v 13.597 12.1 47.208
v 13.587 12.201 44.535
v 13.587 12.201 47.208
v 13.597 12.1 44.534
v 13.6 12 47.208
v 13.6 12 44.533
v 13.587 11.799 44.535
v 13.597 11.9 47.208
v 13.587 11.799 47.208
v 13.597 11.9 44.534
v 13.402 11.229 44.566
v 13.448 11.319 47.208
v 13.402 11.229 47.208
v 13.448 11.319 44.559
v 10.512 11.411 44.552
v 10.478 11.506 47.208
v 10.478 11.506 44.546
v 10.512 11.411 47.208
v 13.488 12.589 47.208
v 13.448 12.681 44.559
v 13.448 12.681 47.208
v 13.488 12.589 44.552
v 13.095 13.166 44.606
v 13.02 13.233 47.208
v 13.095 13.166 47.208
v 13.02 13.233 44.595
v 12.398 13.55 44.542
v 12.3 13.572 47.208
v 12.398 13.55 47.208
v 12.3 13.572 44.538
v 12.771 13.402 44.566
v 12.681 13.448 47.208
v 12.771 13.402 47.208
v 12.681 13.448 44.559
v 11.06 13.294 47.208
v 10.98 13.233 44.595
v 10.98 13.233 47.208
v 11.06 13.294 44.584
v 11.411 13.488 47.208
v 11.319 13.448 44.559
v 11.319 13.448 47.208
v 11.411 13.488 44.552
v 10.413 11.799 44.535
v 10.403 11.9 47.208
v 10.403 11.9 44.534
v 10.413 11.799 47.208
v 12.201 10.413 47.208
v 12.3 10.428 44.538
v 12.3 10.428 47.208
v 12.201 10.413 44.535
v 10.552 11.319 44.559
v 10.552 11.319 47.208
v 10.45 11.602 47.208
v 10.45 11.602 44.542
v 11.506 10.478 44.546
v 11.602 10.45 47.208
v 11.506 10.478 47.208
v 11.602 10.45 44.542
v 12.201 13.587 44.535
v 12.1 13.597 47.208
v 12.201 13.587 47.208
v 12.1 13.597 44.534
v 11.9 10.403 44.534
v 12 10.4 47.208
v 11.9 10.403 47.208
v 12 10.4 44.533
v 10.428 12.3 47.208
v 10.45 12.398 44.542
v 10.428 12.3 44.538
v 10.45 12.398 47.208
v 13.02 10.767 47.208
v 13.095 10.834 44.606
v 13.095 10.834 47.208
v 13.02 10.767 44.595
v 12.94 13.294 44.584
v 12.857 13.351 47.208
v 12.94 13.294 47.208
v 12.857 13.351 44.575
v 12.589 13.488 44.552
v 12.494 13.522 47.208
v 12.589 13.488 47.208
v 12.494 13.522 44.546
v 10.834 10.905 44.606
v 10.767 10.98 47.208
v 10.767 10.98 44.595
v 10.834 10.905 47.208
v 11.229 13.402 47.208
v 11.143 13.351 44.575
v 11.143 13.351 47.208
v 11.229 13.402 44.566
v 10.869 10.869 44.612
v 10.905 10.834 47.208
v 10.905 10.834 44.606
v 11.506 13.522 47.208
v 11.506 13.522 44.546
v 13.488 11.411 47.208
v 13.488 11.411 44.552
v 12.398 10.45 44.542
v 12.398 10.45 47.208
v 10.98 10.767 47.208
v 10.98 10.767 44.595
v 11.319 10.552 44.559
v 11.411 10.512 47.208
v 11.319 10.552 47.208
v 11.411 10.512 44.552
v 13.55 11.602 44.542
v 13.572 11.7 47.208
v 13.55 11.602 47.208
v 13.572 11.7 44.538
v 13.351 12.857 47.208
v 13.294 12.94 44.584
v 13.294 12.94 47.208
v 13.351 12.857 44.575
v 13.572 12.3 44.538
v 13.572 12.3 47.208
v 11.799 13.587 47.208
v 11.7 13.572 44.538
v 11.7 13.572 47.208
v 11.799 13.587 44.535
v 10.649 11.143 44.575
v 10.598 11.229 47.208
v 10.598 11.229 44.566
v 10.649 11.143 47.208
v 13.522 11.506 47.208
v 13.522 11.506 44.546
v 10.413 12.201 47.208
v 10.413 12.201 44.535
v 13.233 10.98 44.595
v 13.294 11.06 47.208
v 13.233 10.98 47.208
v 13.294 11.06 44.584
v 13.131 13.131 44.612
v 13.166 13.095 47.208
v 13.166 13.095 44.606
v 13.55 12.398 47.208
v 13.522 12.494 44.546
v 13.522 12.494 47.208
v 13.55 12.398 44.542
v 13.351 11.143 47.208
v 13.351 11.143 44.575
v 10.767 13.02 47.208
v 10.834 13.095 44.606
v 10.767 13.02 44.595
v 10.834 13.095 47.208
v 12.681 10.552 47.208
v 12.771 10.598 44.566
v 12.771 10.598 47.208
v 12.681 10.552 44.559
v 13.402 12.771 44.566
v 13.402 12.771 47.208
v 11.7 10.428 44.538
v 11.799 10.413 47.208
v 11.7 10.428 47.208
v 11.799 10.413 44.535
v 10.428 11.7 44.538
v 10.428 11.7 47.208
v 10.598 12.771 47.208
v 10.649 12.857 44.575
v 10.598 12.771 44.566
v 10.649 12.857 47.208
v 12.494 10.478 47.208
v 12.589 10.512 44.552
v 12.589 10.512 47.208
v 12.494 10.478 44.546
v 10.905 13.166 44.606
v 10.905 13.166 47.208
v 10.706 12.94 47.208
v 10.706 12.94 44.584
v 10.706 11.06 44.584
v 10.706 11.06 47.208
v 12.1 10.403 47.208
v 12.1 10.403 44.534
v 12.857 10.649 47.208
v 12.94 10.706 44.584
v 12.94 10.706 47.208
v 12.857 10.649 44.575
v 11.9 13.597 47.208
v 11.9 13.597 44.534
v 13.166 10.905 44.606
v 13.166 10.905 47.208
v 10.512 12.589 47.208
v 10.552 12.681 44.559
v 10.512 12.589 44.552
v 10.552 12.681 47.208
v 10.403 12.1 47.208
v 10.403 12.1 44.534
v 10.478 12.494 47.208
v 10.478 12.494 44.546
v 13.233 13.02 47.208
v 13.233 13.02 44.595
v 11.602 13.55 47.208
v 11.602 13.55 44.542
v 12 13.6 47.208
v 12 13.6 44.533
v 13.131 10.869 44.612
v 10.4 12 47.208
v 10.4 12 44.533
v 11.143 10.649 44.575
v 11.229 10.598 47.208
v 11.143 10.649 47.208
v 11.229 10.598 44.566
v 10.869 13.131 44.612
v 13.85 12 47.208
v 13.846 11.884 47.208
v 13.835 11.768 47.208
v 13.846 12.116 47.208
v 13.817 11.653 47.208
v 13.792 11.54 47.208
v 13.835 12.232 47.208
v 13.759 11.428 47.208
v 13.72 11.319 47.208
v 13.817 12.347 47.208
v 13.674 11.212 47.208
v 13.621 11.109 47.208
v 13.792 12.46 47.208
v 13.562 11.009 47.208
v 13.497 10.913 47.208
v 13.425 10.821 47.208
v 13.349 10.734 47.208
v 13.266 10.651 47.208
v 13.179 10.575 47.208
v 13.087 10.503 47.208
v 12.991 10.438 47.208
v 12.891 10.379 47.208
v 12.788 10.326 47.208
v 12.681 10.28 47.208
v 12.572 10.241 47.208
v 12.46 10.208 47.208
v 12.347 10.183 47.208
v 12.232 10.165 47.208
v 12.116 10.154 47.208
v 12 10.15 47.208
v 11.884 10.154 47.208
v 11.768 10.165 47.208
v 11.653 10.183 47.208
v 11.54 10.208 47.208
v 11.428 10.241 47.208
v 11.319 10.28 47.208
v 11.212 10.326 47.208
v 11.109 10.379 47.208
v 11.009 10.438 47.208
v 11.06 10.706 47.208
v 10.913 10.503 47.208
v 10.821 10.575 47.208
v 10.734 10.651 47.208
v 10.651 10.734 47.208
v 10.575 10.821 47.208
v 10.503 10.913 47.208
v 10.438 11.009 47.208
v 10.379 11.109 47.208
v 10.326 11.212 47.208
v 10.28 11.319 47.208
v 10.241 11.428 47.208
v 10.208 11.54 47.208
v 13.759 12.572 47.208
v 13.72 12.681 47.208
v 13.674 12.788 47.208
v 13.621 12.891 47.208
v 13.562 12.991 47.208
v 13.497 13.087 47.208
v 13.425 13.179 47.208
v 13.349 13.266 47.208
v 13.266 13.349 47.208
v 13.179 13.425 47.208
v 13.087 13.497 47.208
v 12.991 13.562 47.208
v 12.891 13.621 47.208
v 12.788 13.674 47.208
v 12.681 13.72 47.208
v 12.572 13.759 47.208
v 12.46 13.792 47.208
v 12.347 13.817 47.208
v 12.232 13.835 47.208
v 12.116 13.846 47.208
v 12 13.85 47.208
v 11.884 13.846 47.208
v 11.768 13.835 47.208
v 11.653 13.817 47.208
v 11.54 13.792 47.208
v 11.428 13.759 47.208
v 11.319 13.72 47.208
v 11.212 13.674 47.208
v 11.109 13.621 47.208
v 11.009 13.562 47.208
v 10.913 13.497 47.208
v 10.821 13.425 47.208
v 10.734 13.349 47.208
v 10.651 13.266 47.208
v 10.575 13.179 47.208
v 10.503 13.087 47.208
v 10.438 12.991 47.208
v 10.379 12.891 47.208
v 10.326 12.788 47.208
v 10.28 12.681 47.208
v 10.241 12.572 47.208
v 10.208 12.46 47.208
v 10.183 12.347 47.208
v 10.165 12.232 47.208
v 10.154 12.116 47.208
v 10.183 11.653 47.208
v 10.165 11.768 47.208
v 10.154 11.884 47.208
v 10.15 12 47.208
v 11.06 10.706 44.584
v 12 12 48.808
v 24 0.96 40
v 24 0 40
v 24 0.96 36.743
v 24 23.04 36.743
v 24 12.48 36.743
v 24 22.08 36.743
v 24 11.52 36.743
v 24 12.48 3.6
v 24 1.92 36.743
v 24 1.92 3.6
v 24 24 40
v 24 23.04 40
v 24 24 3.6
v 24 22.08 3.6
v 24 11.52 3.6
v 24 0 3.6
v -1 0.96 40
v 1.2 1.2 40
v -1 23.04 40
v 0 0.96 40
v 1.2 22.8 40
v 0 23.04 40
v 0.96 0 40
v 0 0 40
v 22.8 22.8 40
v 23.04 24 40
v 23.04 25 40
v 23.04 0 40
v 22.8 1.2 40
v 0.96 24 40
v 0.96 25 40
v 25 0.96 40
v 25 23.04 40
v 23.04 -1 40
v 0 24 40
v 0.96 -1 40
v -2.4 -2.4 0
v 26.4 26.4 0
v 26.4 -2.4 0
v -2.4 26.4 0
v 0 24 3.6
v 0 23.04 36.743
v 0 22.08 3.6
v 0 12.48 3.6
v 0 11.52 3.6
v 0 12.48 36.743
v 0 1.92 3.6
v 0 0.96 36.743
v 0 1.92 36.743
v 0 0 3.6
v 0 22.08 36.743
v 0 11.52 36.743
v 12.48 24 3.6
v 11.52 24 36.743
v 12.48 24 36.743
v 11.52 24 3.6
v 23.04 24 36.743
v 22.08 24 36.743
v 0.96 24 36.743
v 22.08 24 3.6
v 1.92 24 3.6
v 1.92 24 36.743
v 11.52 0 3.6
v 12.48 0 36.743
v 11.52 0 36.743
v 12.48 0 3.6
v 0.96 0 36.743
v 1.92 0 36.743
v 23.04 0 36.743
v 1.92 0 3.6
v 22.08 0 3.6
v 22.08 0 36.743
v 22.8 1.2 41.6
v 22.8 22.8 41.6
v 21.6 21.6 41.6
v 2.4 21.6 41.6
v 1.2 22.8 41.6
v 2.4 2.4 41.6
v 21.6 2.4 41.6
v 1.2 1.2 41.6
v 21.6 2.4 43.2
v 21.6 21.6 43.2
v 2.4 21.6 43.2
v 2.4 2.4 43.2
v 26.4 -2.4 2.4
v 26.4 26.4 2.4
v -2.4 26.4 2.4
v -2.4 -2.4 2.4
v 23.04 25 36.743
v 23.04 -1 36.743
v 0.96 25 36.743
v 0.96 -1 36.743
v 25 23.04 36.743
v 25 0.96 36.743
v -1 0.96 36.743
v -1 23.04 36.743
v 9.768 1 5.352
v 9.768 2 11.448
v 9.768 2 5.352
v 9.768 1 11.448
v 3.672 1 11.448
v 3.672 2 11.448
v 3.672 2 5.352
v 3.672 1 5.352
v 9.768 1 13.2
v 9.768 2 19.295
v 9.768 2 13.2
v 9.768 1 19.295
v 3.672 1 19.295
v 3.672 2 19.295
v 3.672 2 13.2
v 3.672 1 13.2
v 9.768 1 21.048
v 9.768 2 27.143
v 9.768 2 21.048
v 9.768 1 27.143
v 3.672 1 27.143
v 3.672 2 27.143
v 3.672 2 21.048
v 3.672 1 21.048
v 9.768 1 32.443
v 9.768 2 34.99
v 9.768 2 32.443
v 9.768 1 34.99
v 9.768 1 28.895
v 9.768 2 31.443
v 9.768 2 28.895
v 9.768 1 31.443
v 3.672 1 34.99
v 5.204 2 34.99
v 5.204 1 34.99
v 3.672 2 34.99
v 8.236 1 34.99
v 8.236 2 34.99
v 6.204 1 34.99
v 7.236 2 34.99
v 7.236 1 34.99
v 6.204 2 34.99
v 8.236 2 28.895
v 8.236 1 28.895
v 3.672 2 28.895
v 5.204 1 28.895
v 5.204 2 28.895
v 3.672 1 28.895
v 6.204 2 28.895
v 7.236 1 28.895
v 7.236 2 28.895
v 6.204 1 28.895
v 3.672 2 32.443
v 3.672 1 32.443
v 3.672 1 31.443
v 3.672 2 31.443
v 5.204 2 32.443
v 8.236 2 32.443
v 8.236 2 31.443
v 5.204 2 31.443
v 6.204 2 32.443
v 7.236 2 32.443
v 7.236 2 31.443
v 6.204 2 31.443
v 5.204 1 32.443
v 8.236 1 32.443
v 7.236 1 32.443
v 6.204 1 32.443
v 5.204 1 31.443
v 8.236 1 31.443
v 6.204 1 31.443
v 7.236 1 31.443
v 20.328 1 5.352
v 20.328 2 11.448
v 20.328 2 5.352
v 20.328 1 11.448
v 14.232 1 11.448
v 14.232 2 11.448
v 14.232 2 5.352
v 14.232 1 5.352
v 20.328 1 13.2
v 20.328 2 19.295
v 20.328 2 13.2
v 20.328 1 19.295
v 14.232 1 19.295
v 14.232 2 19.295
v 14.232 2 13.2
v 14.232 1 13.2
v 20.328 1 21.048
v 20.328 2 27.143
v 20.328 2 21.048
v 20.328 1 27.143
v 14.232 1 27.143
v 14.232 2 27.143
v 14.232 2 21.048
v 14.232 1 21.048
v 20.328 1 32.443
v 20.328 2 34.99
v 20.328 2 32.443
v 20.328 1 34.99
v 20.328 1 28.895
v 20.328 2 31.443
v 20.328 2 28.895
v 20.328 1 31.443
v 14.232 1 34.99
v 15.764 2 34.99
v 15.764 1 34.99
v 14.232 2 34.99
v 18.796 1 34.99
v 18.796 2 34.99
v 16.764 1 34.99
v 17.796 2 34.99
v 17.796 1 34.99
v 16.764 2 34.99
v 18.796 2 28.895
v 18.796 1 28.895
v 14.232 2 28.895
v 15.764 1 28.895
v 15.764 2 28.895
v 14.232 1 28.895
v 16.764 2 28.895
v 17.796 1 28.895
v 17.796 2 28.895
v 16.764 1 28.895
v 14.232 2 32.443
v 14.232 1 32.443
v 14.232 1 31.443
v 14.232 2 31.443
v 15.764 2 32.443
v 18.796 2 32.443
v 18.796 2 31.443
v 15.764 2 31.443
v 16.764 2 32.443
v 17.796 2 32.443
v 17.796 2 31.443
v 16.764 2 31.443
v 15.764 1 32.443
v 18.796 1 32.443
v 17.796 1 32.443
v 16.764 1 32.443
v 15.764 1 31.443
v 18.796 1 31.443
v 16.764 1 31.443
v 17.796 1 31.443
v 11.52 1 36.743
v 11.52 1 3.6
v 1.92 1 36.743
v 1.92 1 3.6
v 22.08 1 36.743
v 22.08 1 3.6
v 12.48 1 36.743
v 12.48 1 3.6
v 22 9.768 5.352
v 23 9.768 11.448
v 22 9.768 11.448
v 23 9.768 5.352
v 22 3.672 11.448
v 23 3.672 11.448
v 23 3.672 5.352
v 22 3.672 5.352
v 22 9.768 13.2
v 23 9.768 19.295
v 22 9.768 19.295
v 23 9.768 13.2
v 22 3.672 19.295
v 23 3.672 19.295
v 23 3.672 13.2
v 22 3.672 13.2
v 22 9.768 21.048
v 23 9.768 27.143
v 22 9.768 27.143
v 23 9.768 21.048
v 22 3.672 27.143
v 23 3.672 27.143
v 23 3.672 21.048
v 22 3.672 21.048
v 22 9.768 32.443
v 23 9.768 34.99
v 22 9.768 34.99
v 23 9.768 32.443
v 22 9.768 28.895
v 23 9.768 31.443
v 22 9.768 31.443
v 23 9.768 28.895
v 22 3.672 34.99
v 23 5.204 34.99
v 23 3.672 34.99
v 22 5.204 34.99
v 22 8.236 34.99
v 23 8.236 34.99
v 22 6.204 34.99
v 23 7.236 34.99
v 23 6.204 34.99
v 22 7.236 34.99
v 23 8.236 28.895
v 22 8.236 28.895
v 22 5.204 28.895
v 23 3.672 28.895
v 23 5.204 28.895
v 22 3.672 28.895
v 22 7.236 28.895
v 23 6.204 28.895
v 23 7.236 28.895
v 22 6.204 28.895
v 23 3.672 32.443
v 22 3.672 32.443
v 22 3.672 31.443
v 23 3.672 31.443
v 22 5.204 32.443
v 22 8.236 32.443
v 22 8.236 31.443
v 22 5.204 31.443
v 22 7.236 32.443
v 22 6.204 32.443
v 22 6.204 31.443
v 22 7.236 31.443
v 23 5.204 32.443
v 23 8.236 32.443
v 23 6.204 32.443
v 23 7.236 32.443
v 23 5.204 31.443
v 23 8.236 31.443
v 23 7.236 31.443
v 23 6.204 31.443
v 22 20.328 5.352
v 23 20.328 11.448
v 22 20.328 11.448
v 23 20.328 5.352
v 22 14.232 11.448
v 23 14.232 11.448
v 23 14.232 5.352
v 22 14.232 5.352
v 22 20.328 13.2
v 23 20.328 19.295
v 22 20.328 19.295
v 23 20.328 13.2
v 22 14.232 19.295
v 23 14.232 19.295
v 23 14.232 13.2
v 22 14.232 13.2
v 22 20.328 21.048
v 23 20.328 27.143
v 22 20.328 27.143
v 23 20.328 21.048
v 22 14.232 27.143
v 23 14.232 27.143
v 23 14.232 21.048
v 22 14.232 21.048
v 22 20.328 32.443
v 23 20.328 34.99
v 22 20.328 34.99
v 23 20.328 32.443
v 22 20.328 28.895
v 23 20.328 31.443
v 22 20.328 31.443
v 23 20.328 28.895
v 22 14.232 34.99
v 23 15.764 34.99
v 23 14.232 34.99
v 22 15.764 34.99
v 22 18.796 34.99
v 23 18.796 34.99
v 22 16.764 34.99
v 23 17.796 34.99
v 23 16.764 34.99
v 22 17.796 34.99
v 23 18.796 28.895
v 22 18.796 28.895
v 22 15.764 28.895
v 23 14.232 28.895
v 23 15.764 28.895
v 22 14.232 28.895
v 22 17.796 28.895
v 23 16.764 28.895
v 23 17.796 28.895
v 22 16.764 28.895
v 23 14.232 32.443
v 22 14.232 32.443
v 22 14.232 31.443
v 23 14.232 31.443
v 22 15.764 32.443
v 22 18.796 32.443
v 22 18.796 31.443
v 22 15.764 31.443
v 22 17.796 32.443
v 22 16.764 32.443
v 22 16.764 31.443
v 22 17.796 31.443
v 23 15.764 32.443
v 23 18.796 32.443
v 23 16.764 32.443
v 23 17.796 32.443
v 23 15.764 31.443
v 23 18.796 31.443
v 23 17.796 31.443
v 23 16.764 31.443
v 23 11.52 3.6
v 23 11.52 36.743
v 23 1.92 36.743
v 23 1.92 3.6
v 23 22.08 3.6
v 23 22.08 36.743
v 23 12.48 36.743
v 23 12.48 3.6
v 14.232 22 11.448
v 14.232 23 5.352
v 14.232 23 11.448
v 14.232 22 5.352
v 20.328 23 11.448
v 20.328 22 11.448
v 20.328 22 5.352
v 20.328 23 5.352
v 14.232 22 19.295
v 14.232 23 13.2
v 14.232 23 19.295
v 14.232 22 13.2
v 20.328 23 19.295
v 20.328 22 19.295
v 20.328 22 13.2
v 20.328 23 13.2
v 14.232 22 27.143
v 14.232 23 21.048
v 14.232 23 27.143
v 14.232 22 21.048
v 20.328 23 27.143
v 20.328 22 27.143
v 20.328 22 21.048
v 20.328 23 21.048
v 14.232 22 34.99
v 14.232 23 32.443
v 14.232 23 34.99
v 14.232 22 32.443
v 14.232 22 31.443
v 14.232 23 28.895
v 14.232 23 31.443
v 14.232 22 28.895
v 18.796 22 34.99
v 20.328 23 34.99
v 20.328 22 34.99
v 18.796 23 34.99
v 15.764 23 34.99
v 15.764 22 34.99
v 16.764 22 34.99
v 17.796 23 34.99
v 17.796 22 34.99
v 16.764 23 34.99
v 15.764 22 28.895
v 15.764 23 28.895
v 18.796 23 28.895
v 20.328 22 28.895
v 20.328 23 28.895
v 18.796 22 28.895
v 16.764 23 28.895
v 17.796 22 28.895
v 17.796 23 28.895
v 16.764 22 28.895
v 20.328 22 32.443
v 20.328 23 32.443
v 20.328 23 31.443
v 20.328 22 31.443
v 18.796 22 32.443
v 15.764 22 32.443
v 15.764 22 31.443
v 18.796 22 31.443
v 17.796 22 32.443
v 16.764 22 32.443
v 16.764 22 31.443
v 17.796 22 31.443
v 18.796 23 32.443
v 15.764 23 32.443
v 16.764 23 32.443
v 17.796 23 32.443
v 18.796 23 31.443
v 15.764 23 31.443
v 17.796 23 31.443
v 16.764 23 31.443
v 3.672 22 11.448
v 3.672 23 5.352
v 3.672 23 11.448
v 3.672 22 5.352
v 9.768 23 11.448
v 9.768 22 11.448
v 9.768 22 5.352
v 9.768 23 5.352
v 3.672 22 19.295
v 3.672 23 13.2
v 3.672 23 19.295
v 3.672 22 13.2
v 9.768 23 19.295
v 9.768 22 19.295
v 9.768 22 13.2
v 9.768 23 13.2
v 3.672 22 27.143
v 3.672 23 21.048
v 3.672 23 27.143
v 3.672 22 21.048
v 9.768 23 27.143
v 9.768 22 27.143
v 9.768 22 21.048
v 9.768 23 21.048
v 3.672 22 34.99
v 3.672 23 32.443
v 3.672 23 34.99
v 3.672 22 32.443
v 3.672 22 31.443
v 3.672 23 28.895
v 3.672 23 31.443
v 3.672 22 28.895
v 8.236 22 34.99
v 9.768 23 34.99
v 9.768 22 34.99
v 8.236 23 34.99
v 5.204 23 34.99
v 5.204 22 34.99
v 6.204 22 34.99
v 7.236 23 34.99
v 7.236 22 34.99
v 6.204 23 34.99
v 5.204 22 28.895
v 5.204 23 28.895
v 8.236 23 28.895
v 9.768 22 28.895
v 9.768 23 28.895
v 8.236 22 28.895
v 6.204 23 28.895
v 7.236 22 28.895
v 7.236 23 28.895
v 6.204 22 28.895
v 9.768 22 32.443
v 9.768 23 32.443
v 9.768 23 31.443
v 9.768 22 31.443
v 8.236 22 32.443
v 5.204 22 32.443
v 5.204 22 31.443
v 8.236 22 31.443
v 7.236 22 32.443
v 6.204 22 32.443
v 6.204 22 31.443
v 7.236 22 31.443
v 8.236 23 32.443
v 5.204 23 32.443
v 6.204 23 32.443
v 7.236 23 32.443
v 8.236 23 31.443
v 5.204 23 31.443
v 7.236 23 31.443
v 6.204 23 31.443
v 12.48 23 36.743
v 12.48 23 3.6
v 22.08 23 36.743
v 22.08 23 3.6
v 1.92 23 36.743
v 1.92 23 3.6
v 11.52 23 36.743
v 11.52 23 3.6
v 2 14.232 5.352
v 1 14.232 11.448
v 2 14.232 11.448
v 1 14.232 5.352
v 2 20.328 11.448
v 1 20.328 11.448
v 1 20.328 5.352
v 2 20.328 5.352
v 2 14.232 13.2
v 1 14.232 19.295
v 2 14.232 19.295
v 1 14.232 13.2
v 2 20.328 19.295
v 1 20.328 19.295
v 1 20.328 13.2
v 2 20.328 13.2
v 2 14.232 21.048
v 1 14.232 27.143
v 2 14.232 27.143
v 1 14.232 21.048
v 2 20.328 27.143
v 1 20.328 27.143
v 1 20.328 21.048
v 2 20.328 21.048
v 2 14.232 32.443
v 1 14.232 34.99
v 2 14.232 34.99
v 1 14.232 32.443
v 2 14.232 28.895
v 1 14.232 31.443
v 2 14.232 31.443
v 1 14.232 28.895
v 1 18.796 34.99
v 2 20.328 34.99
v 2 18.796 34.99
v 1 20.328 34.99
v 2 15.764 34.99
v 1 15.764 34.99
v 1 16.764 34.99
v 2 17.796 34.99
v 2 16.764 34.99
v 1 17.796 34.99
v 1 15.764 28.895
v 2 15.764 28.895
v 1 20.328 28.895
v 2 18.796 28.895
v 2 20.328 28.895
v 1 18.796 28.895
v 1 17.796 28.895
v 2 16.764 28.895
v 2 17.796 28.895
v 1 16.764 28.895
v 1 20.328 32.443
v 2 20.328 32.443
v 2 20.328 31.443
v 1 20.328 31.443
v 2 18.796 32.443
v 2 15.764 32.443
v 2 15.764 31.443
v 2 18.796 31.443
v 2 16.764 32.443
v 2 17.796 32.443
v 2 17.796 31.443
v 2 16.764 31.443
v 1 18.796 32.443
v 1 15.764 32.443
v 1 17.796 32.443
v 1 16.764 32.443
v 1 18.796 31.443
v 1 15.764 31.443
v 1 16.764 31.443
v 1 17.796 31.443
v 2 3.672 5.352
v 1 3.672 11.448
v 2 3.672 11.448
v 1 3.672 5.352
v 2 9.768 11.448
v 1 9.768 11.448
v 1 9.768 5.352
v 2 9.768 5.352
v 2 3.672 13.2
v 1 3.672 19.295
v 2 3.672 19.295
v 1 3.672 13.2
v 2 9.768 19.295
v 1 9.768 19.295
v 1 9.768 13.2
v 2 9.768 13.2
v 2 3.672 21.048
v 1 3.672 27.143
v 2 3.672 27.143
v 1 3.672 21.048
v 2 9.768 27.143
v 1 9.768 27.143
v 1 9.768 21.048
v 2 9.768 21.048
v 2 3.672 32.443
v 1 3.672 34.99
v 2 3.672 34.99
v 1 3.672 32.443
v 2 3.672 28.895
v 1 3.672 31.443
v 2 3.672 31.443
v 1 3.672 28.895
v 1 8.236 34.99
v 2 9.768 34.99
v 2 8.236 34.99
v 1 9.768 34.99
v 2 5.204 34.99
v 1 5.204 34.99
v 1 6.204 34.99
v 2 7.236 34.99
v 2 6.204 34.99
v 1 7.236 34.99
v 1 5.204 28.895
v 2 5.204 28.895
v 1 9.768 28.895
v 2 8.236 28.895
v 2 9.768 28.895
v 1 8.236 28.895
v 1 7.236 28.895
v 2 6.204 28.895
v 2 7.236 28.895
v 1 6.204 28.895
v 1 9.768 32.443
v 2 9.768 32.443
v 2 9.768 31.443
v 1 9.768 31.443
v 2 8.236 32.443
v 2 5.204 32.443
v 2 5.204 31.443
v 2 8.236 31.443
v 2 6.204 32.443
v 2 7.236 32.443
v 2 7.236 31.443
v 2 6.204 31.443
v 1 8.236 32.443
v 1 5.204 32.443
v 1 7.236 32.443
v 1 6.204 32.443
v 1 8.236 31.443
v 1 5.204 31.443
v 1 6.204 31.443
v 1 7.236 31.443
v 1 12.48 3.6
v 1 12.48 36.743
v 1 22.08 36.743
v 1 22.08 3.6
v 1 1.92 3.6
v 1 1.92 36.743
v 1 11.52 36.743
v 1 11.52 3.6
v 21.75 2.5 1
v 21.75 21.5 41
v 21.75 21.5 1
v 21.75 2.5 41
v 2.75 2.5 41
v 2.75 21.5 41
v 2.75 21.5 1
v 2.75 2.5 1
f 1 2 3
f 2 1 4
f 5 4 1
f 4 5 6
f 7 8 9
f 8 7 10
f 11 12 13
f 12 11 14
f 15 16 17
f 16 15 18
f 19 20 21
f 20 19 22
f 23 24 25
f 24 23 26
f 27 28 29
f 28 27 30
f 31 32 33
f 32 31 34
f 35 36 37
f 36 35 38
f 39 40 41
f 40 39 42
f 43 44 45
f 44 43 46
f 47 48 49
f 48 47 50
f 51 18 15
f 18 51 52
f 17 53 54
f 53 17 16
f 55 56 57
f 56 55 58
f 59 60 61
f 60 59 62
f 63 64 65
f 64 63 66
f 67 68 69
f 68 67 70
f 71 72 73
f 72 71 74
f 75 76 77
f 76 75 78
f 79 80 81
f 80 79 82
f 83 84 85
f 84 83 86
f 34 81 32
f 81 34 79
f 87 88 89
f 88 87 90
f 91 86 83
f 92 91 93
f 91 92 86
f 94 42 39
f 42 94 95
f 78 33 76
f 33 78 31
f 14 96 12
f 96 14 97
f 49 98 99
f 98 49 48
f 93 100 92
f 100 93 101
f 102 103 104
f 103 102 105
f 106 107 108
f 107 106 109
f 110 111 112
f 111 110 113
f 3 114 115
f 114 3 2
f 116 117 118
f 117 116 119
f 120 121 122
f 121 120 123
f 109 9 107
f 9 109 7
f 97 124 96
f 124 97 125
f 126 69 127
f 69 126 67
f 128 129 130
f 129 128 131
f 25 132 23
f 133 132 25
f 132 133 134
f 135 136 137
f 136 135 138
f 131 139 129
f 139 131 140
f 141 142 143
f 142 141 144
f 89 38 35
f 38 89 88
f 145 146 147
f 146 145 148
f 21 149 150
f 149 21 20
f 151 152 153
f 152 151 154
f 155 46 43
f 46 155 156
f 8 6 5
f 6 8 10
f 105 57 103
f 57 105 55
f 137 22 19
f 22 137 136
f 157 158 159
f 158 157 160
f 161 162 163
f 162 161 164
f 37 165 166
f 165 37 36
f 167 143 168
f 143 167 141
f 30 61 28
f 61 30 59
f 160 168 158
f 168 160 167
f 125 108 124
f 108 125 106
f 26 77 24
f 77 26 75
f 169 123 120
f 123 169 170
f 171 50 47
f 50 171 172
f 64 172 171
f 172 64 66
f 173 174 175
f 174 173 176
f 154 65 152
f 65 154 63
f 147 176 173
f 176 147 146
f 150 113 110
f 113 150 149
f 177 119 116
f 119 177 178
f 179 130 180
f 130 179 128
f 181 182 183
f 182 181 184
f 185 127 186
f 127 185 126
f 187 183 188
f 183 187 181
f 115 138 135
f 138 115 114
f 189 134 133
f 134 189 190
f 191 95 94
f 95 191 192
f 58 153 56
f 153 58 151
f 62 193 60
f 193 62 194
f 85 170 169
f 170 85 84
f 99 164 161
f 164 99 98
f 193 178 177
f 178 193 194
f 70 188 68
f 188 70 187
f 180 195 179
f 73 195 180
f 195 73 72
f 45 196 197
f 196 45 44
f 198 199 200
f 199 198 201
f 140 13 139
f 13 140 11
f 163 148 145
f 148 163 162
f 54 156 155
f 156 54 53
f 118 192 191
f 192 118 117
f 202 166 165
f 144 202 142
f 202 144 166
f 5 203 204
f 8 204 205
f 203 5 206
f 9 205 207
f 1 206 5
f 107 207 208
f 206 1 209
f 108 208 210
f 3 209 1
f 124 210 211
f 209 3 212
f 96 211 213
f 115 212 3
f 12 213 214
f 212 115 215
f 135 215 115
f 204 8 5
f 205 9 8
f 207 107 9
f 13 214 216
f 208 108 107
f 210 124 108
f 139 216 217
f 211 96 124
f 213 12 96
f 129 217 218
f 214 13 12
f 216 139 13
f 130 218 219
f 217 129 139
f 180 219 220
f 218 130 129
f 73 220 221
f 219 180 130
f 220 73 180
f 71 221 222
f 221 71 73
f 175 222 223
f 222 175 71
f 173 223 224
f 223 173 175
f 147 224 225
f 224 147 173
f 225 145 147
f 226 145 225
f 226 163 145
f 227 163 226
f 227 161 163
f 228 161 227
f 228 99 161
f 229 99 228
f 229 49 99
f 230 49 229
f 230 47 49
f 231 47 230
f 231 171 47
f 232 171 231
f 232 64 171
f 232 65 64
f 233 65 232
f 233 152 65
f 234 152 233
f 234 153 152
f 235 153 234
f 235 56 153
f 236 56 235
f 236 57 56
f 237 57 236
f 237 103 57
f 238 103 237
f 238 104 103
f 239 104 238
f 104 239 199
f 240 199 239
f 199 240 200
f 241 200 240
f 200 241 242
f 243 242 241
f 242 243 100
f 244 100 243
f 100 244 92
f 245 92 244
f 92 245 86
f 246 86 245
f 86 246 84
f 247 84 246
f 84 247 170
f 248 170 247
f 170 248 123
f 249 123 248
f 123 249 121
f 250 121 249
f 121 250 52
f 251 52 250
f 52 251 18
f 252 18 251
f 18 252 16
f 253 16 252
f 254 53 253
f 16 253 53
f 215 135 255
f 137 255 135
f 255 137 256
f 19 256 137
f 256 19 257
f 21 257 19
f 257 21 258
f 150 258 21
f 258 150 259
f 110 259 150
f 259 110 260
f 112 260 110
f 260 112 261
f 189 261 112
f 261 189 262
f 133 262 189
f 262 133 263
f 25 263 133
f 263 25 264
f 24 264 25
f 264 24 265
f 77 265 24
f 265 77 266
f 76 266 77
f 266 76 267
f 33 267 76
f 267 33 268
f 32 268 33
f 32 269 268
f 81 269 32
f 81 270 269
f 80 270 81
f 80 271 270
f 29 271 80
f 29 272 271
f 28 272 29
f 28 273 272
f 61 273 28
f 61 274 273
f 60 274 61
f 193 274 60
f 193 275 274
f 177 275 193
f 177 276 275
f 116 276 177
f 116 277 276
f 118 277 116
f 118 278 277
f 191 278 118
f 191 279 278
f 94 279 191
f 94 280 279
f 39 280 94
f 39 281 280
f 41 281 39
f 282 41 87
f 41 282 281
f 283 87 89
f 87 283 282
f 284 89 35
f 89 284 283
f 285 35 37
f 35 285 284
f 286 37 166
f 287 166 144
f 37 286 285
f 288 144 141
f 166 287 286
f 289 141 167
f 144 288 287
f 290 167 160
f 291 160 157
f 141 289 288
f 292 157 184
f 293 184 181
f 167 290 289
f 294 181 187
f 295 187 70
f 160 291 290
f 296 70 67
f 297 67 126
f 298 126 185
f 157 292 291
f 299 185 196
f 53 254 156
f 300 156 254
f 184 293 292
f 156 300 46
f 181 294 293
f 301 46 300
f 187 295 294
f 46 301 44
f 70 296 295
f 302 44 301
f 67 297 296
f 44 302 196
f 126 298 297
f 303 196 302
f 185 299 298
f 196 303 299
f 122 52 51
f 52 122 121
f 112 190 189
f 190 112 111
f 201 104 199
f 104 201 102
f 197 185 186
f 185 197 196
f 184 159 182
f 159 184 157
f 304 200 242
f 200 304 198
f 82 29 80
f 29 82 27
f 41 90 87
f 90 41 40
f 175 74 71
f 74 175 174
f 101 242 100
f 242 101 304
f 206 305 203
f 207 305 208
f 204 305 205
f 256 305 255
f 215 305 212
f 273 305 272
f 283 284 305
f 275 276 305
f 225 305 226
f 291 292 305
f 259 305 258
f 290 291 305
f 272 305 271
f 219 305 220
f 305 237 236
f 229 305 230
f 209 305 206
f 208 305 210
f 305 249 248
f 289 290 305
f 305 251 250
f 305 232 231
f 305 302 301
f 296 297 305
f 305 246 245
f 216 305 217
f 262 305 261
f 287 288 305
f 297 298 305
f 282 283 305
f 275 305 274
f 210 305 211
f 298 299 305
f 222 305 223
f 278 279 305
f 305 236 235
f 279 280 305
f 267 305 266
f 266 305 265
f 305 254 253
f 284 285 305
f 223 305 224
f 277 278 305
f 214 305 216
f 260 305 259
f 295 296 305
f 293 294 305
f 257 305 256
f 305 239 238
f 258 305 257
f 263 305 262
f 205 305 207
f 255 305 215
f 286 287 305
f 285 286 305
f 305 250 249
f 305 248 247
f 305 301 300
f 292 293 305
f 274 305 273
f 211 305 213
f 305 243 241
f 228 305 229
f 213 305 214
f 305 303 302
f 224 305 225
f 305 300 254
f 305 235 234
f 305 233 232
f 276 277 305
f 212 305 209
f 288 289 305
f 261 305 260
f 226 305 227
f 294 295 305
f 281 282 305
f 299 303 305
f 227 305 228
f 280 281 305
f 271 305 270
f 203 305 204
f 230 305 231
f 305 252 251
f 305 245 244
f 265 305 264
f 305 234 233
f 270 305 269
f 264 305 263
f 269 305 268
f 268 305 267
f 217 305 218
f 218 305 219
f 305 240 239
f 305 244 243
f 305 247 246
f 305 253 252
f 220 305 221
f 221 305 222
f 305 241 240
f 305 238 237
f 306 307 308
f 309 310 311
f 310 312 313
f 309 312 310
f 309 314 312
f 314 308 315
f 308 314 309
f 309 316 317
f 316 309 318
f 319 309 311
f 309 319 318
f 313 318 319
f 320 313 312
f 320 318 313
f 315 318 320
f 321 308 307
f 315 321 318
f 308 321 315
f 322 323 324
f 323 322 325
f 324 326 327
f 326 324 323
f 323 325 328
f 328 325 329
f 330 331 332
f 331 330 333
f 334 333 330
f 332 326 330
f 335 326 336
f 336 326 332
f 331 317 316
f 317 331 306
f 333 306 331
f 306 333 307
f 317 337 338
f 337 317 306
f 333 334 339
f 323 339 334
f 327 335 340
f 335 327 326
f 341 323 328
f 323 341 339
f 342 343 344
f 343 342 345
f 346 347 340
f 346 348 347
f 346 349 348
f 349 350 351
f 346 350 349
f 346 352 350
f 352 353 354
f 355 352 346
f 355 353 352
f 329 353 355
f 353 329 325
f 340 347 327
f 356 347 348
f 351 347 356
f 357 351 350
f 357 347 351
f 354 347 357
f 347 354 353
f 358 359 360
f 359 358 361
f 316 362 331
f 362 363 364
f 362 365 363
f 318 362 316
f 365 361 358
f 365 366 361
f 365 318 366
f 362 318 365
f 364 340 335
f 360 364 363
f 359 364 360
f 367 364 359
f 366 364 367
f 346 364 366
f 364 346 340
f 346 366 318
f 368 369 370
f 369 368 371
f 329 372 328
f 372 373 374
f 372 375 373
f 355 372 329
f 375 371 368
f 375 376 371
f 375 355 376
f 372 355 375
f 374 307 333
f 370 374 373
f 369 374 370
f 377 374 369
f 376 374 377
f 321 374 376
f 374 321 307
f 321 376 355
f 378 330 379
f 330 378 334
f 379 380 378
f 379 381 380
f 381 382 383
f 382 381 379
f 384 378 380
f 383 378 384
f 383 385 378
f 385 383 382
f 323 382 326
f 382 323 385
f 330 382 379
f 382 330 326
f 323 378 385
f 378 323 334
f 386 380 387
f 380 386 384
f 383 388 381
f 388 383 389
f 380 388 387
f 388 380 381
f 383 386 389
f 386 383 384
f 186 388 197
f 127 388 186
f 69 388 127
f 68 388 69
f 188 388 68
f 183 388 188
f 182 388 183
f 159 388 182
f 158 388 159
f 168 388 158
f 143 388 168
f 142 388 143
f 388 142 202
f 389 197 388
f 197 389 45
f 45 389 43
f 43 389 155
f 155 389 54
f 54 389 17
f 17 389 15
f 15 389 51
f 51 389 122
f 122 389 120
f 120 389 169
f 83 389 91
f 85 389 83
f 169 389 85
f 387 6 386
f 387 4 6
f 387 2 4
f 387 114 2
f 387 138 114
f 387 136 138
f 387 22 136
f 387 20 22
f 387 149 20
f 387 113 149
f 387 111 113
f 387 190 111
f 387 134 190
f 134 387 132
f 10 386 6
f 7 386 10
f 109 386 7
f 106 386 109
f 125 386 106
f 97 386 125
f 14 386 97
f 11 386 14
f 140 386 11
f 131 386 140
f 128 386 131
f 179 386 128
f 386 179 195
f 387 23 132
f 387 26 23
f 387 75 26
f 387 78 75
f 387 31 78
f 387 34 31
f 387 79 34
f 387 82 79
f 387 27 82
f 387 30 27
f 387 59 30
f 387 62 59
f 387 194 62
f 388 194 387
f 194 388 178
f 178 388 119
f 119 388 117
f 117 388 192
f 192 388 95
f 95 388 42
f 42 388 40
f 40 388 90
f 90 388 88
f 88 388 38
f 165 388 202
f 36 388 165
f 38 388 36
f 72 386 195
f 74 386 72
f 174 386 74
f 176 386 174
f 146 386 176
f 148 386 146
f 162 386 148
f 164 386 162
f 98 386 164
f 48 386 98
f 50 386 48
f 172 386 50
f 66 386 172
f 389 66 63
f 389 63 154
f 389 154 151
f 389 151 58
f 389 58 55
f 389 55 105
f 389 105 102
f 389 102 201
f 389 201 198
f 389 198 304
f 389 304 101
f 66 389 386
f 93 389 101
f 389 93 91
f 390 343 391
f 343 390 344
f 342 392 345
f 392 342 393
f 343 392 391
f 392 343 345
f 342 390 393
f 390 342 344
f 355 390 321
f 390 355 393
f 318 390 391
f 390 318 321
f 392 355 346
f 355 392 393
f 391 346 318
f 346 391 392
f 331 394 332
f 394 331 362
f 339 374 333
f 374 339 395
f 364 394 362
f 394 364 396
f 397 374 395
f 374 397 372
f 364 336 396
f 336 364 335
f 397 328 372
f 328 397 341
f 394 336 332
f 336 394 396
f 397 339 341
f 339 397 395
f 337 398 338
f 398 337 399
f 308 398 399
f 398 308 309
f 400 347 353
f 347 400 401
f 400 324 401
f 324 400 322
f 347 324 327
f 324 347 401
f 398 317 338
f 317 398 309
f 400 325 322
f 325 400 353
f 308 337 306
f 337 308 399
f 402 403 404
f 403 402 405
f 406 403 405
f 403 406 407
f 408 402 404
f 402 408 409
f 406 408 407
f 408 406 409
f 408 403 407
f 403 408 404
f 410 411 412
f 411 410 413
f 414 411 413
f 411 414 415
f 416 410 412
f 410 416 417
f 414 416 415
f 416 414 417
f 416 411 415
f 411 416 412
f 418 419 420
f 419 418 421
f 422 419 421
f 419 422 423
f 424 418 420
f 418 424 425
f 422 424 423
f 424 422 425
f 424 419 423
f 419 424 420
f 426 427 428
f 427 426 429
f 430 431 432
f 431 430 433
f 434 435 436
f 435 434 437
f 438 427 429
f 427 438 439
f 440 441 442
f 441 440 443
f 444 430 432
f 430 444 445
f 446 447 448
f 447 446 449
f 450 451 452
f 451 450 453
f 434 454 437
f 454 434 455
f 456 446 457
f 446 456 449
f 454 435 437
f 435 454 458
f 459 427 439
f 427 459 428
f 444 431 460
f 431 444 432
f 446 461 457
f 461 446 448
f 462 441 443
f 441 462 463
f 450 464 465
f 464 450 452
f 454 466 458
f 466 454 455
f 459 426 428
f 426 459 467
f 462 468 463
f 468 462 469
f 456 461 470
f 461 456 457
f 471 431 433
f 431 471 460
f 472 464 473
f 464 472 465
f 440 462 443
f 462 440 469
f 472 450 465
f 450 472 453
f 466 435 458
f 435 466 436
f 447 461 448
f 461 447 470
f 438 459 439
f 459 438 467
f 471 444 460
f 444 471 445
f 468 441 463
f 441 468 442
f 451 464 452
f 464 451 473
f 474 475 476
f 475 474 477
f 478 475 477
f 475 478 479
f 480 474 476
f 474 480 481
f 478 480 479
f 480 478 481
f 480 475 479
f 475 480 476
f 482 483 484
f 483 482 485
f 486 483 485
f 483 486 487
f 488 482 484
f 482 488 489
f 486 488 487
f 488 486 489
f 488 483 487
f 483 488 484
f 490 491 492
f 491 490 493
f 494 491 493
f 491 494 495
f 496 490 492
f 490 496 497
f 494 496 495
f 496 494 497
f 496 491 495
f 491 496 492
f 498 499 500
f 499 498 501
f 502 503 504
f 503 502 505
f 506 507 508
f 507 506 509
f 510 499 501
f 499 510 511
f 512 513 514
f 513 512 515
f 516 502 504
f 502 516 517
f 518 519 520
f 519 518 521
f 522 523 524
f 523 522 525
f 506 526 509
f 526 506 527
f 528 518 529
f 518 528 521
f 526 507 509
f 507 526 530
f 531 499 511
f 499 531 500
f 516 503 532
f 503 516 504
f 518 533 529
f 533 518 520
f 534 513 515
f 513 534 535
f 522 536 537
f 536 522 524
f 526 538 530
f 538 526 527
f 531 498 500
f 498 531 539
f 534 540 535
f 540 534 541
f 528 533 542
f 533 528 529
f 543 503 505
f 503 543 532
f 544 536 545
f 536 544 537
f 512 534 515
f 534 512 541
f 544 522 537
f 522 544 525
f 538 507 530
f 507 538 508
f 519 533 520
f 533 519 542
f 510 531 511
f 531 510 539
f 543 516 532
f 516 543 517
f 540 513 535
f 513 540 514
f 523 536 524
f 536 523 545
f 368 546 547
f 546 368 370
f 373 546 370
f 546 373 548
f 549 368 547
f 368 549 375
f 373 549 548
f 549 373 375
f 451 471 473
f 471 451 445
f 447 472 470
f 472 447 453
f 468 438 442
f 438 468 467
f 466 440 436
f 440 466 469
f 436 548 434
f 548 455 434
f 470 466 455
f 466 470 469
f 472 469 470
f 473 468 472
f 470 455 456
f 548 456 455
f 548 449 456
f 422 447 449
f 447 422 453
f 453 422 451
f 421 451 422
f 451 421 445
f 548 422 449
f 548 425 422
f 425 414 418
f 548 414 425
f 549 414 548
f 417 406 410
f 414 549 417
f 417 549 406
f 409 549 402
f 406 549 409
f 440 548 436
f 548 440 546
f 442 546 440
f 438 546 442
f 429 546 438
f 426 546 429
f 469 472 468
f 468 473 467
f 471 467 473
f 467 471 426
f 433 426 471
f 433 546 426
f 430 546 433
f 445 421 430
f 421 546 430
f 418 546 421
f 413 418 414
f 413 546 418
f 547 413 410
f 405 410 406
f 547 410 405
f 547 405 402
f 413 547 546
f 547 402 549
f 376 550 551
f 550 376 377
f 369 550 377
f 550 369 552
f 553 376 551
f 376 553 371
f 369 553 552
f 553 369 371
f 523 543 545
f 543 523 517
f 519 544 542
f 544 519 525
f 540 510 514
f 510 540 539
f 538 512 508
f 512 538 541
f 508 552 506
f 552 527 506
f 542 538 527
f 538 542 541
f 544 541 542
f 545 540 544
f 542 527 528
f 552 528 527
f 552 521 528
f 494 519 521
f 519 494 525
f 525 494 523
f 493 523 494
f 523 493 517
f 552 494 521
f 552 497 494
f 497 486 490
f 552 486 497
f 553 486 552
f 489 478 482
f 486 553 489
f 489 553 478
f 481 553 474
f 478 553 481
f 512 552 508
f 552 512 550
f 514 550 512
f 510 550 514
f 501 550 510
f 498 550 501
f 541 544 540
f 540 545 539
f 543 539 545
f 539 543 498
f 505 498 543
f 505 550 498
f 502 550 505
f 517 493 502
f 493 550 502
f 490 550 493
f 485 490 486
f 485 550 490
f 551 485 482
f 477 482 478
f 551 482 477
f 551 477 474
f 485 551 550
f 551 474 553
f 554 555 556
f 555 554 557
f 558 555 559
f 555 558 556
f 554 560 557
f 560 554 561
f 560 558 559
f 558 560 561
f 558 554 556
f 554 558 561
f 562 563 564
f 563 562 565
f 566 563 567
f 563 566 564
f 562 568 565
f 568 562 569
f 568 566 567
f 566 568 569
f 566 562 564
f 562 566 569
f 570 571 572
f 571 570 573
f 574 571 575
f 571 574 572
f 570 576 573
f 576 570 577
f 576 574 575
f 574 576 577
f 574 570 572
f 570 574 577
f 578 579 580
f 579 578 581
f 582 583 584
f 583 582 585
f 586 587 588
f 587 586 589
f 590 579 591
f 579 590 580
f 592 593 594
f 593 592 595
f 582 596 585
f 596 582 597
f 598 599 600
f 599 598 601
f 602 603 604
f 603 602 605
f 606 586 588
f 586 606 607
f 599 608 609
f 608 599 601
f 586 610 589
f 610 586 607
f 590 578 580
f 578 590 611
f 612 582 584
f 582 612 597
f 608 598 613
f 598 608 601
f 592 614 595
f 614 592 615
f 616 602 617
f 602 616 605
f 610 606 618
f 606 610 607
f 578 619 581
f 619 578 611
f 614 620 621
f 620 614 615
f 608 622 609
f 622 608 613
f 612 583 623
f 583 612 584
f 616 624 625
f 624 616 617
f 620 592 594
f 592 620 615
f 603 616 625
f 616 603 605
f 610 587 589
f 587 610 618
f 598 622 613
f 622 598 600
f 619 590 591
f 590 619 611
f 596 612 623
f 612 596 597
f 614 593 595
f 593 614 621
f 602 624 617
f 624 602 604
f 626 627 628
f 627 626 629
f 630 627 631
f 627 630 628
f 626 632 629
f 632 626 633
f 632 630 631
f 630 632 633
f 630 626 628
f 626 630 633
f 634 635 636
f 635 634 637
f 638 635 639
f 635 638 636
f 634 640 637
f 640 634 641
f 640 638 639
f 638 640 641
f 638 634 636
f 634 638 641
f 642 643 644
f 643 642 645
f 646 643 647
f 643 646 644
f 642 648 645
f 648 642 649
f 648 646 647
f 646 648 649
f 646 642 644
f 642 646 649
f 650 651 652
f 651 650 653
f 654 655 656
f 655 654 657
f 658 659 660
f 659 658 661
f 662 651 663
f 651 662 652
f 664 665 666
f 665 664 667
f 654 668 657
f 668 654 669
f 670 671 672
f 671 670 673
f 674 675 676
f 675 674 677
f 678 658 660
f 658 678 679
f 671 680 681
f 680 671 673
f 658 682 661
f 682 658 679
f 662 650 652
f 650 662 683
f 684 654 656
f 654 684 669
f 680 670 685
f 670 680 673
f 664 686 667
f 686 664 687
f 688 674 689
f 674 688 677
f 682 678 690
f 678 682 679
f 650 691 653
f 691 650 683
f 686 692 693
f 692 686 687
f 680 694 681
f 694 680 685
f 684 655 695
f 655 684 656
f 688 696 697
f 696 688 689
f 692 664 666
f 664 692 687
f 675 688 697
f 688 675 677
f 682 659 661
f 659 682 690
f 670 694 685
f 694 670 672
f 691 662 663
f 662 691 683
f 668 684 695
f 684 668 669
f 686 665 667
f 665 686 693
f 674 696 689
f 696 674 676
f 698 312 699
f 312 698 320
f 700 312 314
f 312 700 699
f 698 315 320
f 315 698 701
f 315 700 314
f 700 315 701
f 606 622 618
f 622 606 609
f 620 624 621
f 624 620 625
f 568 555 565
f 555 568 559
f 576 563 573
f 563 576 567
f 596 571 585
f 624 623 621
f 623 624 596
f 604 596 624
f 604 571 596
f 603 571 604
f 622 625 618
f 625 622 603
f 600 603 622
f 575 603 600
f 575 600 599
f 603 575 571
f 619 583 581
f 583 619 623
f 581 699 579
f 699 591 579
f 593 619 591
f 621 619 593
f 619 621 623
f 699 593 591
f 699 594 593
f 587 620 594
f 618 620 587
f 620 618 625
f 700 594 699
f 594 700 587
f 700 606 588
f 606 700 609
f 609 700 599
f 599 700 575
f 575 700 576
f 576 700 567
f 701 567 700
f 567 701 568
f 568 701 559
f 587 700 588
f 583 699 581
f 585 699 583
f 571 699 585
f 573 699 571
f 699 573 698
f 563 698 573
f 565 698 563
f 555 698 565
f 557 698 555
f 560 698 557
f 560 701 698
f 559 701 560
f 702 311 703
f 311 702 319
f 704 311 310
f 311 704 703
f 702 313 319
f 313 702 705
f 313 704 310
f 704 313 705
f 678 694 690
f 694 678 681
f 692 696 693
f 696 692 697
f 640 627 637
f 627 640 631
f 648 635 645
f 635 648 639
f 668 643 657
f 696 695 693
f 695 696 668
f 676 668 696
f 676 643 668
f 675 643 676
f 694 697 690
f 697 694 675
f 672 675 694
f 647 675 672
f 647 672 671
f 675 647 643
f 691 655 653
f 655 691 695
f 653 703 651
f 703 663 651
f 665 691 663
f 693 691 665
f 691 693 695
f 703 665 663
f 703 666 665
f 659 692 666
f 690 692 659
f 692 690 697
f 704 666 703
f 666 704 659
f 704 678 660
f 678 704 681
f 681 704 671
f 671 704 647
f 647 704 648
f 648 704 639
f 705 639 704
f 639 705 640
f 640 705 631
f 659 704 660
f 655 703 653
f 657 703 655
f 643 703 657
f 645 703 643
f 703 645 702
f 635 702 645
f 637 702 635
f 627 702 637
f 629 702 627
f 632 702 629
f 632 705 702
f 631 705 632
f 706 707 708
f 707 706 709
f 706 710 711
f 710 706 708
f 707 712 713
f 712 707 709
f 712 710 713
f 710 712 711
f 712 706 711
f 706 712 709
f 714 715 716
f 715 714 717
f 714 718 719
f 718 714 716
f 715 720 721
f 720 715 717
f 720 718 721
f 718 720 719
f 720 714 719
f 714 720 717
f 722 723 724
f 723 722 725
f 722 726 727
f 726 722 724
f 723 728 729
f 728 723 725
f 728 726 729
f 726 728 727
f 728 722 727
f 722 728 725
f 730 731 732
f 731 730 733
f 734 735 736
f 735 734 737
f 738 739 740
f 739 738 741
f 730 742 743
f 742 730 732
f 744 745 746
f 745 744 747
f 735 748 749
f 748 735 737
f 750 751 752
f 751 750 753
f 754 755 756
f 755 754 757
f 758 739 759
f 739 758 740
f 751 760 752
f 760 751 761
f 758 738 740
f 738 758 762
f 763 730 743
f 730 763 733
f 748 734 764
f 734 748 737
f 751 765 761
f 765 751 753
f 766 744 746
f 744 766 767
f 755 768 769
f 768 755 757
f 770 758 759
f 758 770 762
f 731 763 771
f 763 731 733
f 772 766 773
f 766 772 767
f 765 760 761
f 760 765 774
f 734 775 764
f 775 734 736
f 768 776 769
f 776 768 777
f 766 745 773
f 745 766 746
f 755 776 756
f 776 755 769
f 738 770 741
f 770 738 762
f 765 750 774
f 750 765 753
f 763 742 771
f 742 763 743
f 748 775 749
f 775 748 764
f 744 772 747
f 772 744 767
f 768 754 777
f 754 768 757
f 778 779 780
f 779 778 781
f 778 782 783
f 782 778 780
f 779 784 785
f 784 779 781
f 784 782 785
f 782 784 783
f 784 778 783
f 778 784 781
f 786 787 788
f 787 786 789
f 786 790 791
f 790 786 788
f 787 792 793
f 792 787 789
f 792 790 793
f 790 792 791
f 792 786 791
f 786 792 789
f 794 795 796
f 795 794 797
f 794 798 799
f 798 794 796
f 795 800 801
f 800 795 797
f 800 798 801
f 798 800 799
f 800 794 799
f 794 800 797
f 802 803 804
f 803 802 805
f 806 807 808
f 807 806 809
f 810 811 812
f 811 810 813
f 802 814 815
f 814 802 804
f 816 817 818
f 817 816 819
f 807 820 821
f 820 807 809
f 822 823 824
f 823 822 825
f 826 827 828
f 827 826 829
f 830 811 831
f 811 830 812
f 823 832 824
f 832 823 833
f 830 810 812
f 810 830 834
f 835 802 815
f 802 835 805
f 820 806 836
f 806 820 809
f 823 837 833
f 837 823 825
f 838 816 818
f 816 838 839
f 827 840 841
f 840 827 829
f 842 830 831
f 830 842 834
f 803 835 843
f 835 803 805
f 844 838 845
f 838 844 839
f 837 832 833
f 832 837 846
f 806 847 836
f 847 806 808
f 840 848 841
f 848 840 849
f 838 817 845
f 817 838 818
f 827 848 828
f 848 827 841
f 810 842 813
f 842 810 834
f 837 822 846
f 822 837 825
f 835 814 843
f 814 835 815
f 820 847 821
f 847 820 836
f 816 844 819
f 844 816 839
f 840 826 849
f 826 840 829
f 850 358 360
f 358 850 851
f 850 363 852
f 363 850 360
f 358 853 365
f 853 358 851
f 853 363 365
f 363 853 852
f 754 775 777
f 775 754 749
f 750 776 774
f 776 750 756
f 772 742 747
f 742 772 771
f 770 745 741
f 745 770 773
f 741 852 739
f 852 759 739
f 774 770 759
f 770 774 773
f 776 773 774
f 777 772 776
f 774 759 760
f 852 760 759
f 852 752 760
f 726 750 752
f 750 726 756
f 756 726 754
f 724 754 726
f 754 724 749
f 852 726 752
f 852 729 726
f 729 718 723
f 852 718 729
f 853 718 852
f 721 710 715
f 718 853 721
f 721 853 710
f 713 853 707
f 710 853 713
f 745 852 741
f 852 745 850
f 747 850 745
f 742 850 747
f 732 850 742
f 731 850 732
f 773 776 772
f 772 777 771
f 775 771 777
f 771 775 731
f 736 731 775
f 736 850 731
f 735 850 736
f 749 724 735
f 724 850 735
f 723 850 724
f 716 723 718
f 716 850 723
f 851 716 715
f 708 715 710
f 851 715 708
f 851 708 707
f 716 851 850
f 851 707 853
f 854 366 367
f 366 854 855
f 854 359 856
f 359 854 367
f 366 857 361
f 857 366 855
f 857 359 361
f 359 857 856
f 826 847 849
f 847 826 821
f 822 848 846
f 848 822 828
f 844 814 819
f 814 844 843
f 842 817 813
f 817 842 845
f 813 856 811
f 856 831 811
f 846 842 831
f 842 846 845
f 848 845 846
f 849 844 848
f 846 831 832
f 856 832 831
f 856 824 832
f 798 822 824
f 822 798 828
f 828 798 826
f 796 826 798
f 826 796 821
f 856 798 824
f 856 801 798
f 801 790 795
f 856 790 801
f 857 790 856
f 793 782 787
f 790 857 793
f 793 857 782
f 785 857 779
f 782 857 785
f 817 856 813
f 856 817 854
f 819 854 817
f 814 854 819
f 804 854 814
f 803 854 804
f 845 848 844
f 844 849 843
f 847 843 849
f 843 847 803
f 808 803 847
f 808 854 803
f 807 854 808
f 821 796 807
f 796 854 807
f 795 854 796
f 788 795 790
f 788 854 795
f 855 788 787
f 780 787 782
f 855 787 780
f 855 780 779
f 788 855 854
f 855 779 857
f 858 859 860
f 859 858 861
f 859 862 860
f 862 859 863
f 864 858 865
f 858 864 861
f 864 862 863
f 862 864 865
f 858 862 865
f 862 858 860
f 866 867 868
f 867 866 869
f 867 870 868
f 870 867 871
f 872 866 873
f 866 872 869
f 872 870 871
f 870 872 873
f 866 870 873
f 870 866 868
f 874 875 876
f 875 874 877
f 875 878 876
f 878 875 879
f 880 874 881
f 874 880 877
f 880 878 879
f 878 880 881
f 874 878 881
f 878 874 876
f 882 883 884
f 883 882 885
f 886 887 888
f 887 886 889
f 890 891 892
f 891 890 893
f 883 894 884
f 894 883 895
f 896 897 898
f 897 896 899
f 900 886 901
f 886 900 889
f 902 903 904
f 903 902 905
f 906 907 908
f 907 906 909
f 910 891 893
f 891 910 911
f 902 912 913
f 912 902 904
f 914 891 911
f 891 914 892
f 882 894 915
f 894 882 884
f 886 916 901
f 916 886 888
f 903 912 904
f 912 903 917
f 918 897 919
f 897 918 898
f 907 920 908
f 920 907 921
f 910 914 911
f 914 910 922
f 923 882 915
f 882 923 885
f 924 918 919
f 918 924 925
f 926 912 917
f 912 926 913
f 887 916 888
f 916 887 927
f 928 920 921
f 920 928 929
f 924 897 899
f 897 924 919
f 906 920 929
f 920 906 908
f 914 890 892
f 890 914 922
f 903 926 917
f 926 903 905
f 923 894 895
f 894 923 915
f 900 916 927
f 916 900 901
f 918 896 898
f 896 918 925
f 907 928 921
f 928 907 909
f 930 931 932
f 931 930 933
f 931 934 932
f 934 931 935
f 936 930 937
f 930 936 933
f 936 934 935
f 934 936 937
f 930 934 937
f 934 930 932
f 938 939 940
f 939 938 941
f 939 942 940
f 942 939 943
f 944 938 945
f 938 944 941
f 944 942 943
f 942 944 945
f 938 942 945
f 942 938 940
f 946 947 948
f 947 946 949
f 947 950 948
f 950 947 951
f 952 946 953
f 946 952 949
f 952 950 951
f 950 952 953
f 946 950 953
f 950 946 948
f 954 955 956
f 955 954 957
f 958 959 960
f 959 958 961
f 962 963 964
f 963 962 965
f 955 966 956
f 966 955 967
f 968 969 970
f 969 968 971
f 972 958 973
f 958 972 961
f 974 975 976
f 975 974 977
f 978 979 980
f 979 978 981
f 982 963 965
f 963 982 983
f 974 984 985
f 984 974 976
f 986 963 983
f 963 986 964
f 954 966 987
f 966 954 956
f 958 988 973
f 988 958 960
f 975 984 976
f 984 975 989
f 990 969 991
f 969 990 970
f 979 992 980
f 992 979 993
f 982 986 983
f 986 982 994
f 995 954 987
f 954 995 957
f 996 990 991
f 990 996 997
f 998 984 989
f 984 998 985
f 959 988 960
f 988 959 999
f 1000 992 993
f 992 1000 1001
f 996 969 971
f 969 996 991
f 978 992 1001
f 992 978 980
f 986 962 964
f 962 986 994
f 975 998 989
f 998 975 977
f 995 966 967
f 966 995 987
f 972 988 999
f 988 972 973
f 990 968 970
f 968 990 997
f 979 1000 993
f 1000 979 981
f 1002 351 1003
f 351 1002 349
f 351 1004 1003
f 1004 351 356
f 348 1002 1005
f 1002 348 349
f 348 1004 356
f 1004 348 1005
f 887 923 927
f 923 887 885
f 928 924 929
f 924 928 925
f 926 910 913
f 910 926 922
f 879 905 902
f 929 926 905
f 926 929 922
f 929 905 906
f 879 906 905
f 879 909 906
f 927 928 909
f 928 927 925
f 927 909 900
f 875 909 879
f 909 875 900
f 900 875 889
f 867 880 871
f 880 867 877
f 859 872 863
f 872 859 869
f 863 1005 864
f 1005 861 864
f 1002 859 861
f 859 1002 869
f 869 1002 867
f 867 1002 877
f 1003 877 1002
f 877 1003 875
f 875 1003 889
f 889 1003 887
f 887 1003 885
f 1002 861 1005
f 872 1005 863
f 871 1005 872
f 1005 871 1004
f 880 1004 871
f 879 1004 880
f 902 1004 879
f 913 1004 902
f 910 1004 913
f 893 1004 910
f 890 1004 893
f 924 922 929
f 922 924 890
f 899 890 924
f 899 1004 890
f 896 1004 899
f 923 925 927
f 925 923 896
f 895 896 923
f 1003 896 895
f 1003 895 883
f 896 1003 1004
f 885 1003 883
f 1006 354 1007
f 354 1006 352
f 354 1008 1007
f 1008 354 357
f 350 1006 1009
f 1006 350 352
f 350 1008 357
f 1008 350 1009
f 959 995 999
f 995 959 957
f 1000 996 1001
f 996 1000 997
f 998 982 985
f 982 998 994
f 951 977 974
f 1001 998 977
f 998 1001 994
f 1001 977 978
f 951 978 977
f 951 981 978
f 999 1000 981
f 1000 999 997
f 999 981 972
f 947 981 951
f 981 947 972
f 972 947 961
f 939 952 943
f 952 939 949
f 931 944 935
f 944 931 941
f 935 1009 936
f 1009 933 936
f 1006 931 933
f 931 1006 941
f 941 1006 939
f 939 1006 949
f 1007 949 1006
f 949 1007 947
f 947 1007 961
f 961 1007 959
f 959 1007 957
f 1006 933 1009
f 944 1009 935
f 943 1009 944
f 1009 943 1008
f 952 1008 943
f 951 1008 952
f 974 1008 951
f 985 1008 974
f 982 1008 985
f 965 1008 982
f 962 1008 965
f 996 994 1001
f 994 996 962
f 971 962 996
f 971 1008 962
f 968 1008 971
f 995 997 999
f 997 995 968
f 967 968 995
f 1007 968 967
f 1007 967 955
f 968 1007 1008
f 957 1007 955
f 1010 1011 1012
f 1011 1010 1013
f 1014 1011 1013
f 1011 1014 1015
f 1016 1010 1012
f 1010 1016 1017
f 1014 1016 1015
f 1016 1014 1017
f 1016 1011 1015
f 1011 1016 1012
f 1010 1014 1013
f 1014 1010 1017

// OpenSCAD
//#########################################################################################\\
//\\\\\\\\\\\\\\\\\\\\\\\\\\\\\\\\\\\\Lab 4////////////////////////////////////////////////\\
//\\\\\\\\\\\\\\\\\\\\\\\\\\\\\\ Anush Mattapalli//////////////////////////////////////////\\
//\\I worked on the homework assignment alone, using only this semester's course materials/\\
//\\\\\\\\\\\\\\\\\\\\\\\\\\\amattapalli3@gatech.edu///////////////////////////////////////\\
//#########################################################################################\\


//The user manual really helps :D
//Change Dimensions with these
H = 40;  										//Height of main section cube
Ratio =0.6;  								//Height to Width Ratio	
S = H * Ratio;  							//Width of each side
Lr = S/15; 									// Light Radius
Lh = H/9;  									// Light Height
Dh = H - S/3.5;  							// Door Height
Dw = 2 * S/5;  							// Door Width
Po = (-Dh + 8 * S / 5) / 3;  		// Panel Offset
Pr = Dw - (2 * Po);  					// Panel Size
HD = S/2.5; 									// Hollowing out diameter

$fn = 100;

color([0,0,.7])
difference()
{
	union()
	{
		//Main Box
		cube([S,S,H]);
		//Middle Box
		translate([S/20,S/20,0]) cube([S-(S/10),S-(S/10),H+(S/15)]);
		//Top Box
		translate([S/10,S/10,0]) cube([S-(S/5),S-(S/5),H+(S/7.5)]);
		//Roof THE WORST SHAPE TO MAKE
   		polyhedron(
			points=[ [S/2,S/2,H+(S/5)],[S/10,S/10,H+(S/7.5)],[S/10,S-S/10,H+(S/7.5)],
			[S-S/10,S-S/10,H+(S/7.5)],[S-S/10,S/10,H+(S/7.5)]],
			triangles=[ [0,1,2], [0,2,3],[0,3,4],[0,4,1],[1,3,2],[1,4,3] ]
		);

		//Bottom Fringe
		translate([-S/10,-S/10,0]) cube([S + S/5, S + S/5,S/10]);
		translate([-S/10,-S/10,0]) polyhedron(points= [ [0,0,S/10], [S + S/5,0,S/10], [S + S/5,S + 			S/5,S/10],[0,S + S/5,S/10], [(S + S/5)/2,(S + S/5)/2, S/2.5] ],
		triangles = [ [0,4,1], [1,4,2], [2,4,3], [3,4,0], [0,1,2], [0,2,3] ] );
		
		//Top
		translate([S/2,S/2,H+S/5.5]) 
		union()
		{
			cylinder(Lh - Lr, r = Lr);
			translate([0,0,Lh-Lr]) cylinder(Lr, Lr + 0.25,0);
		}
		//Plates
		translate([S/25,-1,H-S/3.5+3*S/20]) cube([S-2*S/25, S + 2, S/3.5-3*S/20]);
		translate([-1,S/25,H-S/3.5+3*S/20]) cube([S + 2, S-2*S/25, S/3.5-3*S/20]);
	}

	//Make ALL the faces
	for(i=[0,90,180,270])//rotates around the box
	{
		translate([S/2,S/2,0]) rotate([0,0,i]) translate([-S/2,-S/2,0]) faces();
	}

	//Yes, it is hollow
	translate([S/2,S/2,-1]) union()
	{
		translate([(-S/2)+2.75,(-S/2)+2.5,2]) cube([S-5,S-5,H]);
		//translate([0,0,H - S/5 - 1]) sphere(r=S/2.5);
		//translate([0,0,H - S/5 -1-.01]) cylinder(S/2.5,HD,Lr);
	}
	


}


//Ha! I have a module
module faces()//faces is the name of the game
{
	render() color([0,0,0.5]) translate([0,-1,3 * S/20])
	union()
	{
		translate([2*S/25,0,0]) cube([Dw,2,Dh]);
		translate([13*S/25,0,0]) cube([Dw,2,Dh]);
		color([0,0,0.7])
		for(i=[2*S/25 + Po,Po + 13*S/25])
		{
			for(j=[0,1,2])
			{
				translate([i,0,(j+1) * Po + j * Pr]) cube([Pr, 3, Pr]);
			}
			difference(){
			translate([i,0,4 * Po + 3 * Pr]) cube([Pr, 3, Pr]);
			translate([i,0,4 * Po + 3.5 * Pr -0.5]) cube([Pr,4,1]);
			translate([i+Pr/3-0.5,0,4 * Po + 3* Pr]) cube([1,4,Pr]);
			translate([i+2*Pr/3-0.5,0,4 * Po + 3* Pr]) cube([1,4,Pr]);
			}			
		}		
	}
}

// i actually based the design off of the actual Tardis from doctor who. I tried to make it as proportional as possible
